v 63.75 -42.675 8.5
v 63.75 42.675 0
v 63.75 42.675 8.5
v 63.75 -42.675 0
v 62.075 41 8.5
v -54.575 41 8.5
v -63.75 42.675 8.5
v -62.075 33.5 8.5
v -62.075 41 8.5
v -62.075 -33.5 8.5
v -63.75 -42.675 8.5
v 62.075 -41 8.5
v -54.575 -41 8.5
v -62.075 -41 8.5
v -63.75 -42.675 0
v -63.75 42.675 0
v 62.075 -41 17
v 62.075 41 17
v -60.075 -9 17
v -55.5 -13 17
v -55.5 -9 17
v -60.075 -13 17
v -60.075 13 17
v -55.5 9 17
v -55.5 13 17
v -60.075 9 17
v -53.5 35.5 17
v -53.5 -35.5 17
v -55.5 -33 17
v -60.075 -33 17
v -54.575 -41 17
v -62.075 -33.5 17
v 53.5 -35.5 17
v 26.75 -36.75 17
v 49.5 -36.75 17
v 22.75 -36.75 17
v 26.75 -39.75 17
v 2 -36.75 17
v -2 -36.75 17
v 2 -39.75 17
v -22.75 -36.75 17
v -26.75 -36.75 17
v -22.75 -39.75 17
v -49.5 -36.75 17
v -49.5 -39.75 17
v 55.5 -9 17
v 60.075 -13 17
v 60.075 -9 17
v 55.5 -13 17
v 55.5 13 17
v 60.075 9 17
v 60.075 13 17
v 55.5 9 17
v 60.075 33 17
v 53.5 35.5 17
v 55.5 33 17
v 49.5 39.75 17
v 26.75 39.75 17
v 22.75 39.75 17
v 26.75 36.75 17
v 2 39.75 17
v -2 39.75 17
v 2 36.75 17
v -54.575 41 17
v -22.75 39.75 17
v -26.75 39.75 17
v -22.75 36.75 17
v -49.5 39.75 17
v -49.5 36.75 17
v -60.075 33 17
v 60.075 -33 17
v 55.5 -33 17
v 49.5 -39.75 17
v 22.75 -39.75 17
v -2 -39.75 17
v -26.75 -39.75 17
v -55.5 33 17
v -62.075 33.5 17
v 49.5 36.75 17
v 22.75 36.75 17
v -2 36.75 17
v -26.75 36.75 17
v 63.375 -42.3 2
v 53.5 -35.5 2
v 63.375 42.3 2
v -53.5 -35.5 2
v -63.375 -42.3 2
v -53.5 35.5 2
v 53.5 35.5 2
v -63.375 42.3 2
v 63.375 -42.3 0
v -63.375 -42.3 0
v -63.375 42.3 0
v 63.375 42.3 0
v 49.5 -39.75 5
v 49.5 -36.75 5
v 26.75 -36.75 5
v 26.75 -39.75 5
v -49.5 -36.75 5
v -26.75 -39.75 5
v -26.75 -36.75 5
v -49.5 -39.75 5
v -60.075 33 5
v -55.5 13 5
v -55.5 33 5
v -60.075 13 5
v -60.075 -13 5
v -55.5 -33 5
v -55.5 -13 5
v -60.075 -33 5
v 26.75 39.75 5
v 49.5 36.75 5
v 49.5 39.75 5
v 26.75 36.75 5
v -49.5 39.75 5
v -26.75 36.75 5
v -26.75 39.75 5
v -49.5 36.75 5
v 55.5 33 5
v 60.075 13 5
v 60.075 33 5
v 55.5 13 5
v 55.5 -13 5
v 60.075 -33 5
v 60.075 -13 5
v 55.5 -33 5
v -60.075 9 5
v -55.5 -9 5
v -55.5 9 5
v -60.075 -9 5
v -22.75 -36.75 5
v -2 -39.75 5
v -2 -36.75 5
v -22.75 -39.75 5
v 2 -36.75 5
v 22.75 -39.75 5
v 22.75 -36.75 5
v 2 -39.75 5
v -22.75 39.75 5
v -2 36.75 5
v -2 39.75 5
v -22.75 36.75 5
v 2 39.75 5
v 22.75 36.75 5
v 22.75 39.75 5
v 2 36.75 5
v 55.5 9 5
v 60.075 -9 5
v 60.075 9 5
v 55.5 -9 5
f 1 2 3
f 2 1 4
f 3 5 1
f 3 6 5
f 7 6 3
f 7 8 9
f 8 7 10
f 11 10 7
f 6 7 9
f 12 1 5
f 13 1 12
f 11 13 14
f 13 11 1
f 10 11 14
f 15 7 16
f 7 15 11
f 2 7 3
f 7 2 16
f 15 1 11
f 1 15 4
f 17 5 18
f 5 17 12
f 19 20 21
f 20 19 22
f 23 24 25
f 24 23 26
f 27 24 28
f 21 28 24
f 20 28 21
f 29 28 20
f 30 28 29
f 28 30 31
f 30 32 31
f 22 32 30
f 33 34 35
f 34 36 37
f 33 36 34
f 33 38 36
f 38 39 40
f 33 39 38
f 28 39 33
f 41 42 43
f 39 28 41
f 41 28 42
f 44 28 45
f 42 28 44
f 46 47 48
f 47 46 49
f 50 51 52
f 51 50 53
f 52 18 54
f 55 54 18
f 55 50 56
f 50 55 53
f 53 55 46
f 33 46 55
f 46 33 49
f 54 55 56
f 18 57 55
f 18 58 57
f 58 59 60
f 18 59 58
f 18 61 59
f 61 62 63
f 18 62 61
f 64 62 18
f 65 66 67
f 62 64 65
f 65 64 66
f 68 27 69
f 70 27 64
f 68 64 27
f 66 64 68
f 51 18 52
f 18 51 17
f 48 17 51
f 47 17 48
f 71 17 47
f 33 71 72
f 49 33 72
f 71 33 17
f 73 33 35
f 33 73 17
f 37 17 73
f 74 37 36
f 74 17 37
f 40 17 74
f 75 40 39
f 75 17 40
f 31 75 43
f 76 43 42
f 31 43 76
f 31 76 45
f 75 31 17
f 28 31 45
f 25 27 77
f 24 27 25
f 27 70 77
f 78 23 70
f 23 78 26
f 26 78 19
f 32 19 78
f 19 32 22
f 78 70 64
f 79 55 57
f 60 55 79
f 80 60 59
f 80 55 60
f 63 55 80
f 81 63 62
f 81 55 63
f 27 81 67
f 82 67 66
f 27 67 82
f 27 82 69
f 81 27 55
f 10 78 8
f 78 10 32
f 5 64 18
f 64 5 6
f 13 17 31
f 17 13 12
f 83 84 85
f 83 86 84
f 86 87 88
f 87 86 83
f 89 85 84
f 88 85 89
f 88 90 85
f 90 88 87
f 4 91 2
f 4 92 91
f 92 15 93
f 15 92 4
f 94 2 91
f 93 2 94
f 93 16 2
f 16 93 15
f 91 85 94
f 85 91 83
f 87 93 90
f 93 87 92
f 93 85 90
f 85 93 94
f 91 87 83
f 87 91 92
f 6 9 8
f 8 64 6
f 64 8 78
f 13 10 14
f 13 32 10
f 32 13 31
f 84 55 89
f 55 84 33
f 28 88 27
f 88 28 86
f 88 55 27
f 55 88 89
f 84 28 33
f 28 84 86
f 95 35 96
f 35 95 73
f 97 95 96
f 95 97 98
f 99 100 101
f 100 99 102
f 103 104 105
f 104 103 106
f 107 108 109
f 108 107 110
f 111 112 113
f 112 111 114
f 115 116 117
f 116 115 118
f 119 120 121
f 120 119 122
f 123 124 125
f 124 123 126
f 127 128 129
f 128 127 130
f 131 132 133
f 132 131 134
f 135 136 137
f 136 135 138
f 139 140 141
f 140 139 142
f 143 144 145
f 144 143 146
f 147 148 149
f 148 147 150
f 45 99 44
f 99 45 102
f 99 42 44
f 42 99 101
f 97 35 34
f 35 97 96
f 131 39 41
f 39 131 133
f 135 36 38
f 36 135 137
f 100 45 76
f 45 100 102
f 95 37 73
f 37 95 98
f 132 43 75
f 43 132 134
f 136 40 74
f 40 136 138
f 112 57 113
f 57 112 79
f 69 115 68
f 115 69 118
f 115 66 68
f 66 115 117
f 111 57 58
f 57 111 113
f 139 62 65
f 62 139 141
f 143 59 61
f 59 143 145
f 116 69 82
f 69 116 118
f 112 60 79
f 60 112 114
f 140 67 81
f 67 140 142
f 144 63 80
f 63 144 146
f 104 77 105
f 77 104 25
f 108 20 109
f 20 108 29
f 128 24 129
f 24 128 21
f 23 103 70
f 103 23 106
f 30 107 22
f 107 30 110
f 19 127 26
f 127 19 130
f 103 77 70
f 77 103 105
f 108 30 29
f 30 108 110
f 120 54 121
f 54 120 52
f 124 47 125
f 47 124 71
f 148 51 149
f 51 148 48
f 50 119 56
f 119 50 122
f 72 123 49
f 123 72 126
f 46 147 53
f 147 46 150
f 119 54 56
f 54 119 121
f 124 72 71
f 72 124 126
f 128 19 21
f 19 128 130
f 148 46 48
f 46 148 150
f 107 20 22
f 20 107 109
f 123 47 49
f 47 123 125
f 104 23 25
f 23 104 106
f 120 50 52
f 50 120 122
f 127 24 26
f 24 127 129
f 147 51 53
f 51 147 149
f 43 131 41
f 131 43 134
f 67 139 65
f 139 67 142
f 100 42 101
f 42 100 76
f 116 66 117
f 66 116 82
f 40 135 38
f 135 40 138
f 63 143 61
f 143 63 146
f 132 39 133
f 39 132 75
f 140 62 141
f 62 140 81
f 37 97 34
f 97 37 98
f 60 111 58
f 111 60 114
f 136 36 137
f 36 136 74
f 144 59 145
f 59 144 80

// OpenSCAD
// Generated by SolidPython 1.1.3 on 2024-12-03 19:32:34


difference() {
	union() {
		translate(v = [0, 22.0000000000, 0]) {
			translate(v = [0, -33.0000000000, 11.0000000000]) {
				cube(center = true, size = [124.1500000000, 4, 12]);
			}
		}
		translate(v = [0, 44.0000000000, 0]) {
			translate(v = [0, -33.0000000000, 11.0000000000]) {
				cube(center = true, size = [124.1500000000, 4, 12]);
			}
		}
		translate(v = [24.7500000000, 0, 0]) {
			translate(v = [-49.5000000000, 0, 11.0000000000]) {
				cube(center = true, size = [4, 82, 12]);
			}
		}
		translate(v = [49.5000000000, 0, 0]) {
			translate(v = [-49.5000000000, 0, 11.0000000000]) {
				cube(center = true, size = [4, 82, 12]);
			}
		}
		translate(v = [74.2500000000, 0, 0]) {
			translate(v = [-49.5000000000, 0, 11.0000000000]) {
				cube(center = true, size = [4, 82, 12]);
			}
		}
		difference() {
			difference() {
				difference() {
					difference() {
						union() {
							difference() {
								union() {
									translate(v = [0, 0, 4.2500000000]) {
										cube(center = true, size = [127.5000000000, 85.3500000000, 8.5000000000]);
									}
									translate(v = [0, 0, 12.7500000000]) {
										cube(center = true, size = [124.1500000000, 82, 8.5000000000]);
									}
								}
								translate(v = [0, 0, 1.0000000000]) {
									cube(center = true, size = [127.5000000000, 85.3500000000, 2]);
								}
							}
							intersection() {
								difference() {
									translate(v = [0, 0, 1.0000000000]) {
										cube(center = true, size = [127.5000000000, 85.3500000000, 2]);
									}
									translate(v = [0, 0, 1.0000000000]) {
										cube(center = true, size = [126.7500000000, 84.6000000000, 2]);
									}
								}
								union() {
									translate(v = [-63.7500000000, 42.6750000000, 0]) {
										translate(v = [0, 0, 1.0000000000]) {
											cube(center = true, size = [127.5000000000, 85.3500000000, 2]);
										}
									}
									translate(v = [63.7500000000, 42.6750000000, 0]) {
										translate(v = [0, 0, 1.0000000000]) {
											cube(center = true, size = [127.5000000000, 85.3500000000, 2]);
										}
									}
									translate(v = [-63.7500000000, -42.6750000000, 0]) {
										translate(v = [0, 0, 1.0000000000]) {
											cube(center = true, size = [127.5000000000, 85.3500000000, 2]);
										}
									}
									translate(v = [63.7500000000, -42.6750000000, 0]) {
										translate(v = [0, 0, 1.0000000000]) {
											cube(center = true, size = [127.5000000000, 85.3500000000, 2]);
										}
									}
								}
							}
						}
						union() {
							translate(v = [-62.0750000000, 41.0000000000, 8.5000000000]) {
								translate(v = [0, -7.5000000000, 0]) {
									linear_extrude(height = 8.5000000000) {
										polygon(points = [[0, 0], [0, 7.5000000000], [0, 7.5000000000], [0, 7.5000000000], [7.5000000000, 7.5000000000], [7.5000000000, 7.5000000000]]);
									}
								}
							}
							translate(v = [-62.0750000000, -41.0000000000, 8.5000000000]) {
								translate(v = [7.5000000000, 0, 0]) {
									rotate(a = 90) {
										linear_extrude(height = 8.5000000000) {
											polygon(points = [[0, 0], [0, 7.5000000000], [0, 7.5000000000], [0, 7.5000000000], [7.5000000000, 7.5000000000], [7.5000000000, 7.5000000000]]);
										}
									}
								}
							}
						}
					}
					translate(v = [0, 0, 8.5000000000]) {
						cube(center = true, size = [107, 71, 17.0000000000]);
					}
				}
				union() {
					translate(v = [0, -38.25, 0]) {
						translate(v = [0, 0, 11.0000000000]) {
							cube(center = true, size = [99, 3.0000000000, 12]);
						}
					}
					translate(v = [0, 38.25, 0]) {
						translate(v = [0, 0, 11.0000000000]) {
							cube(center = true, size = [99, 3.0000000000, 12]);
						}
					}
					translate(v = [-57.7875, 0, 0]) {
						translate(v = [0, 0, 11.0000000000]) {
							cube(center = true, size = [4.5750000000, 66, 12]);
						}
					}
					translate(v = [57.7875, 0, 0]) {
						translate(v = [0, 0, 11.0000000000]) {
							cube(center = true, size = [4.5750000000, 66, 12]);
						}
					}
				}
			}
			union() {
				translate(v = [0, 0, 17.0000000000]) {
					cube(center = true, size = [115.575, 66, 0]);
				}
				translate(v = [0, 0, 17.0000000000]) {
					cube(center = true, size = [99, 76.5, 0]);
				}
			}
		}
	}
	translate(v = [0, 0, 8.5000000000]) {
		cube(center = true, size = [107, 71, 17.0000000000]);
	}
}
/***********************************************
*********      SolidPython code:      **********
************************************************
 
import solid
import numpy as np
from make_device import make_unit_array
import os.path as osp
import os 
import math

chamfer_extrude=solid.import_scad("./chamfer_extrude.scad")
chamfer_extrude=chamfer_extrude.chamfer_extrude
version="print_PP_v2"
base_name="96_well_plate_reservoirs_"+version
base_path="./plates/"+base_name
#basic plate dims
plate_size_outer=[127.5,85.35]
plate_size_inner=[124.15,82]
plate_height_outer=8.5
plate_height_inner=8.5
plate_height=plate_height_inner+plate_height_outer
plate_under_depth=2
skirt_thickness=.75
skirt_hole_dims=[plate_size_outer[0],plate_size_outer[1]]
corner_x=7.5
corner_y=7.5
grid_size=[1,1]
#device_tol=2
#dims = [110-device_tol,74-device_tol,0]
#device_dims=[110-device_tol,74-device_tol]
dims = [107,71,0]
device_dims=[107,71]
reservoir_x_tol=8
reservoir_y_tol=5
reservoir_dims_x=[device_dims[0]-reservoir_x_tol,(plate_size_inner[1]-device_dims[1]-reservoir_y_tol)/2.0]
reservoir_dims_y=[(plate_size_inner[0]-device_dims[0]-reservoir_x_tol)/2.0,device_dims[1]-reservoir_y_tol]
reservoir_depth=12
lower_wall_height=0
release_holes=False
release_radius=2.5
reservoir_number_x=3
reservoir_number_y=4
reservoir_wall_thickness=4


def save_model(model,base_path,base_name):
    if not osp.exists(base_path):
        os.makedirs(base_path)
    scad_path=osp.join(base_path,base_name+".scad")
    solid.scad_render_to_file(model,osp.join(scad_path))

def center_unit_array(model,dims,grid_size):
    model = solid.translate([dims[0]/2.0,dims[1]/2.0,0])(model)
    model = solid.translate([-dims[0]*(grid_size[0]/2.0),
                             -dims[1]*(grid_size[1]/2.0),0])(model)
    return model


#plate_chassis
plate_height_diff=plate_height-plate_height_inner

#outer_plate as base
plate=solid.cube((*plate_size_outer,plate_height_diff),center=True)
plate=solid.translate([0,0,plate_height_diff/2.0])(plate)
#inner plate goes on top
plate_inner=solid.cube((*plate_size_inner,plate_height_inner),center=True)
plate_inner=solid.translate([0,0,plate_height_inner/2.0+plate_height_diff])(plate_inner)
plate=solid.union()(plate,plate_inner)


plate_under_remove_out=solid.cube((*plate_size_outer,plate_under_depth),center=True)
plate_under_remove_out=solid.translate([0,0,plate_under_depth/2.0])(plate_under_remove_out)
plate_under_remove_in=solid.cube((plate_size_outer[0]-skirt_thickness,plate_size_outer[1]-skirt_thickness,plate_under_depth),center=True)
plate_under_remove_in=solid.translate([0,0,plate_under_depth/2.0])(plate_under_remove_in)

plate_under_remove=solid.difference()(plate_under_remove_out,plate_under_remove_in)

corners_from_x_y = lambda x,y: [[-x/2.0,y/2.0],
                                    [x/2.0, y/2.0],
                                    [-x/2.0, -y/2.0],
                                    [x/2.0, -y/2.0]]
plate_under_remove_corner=solid.cube((*skirt_hole_dims,plate_under_depth),center=True)
plate_under_remove_corner=solid.translate([0,0,plate_under_depth/2.0])(plate_under_remove_corner)
plate_corners_pos=corners_from_x_y(*plate_size_outer)
plate_under_remove_corners=[]
for corner_pos in plate_corners_pos:
    temp_corner=solid.translate([*corner_pos,0])(plate_under_remove_corner)
    plate_under_remove_corners.append(temp_corner)

corners_remove=solid.union()(*plate_under_remove_corners)
skirt=solid.intersection()(plate_under_remove,corners_remove)
#chamfer skirt
#skirt=solid.projection()(skirt)
#skirt=chamfer_extrude(plate_under_depth,45,segments=20)(skirt)
#skirt=solid.linear_extrude(height=plate_under_depth)(skirt)
#skirt=solid.intersection()(plate,skirt)
#
#skirt=solid.translate([0,0,-plate_under_depth/2.0])(skirt)
#skirt=solid.rotate([0,180,0])(skirt)
#skirt=solid.translate([0,0,plate_under_depth/2.0])(skirt)

plate=solid.difference()(plate,plate_under_remove_out)
plate=solid.union()(plate,skirt)



#corners
#               0       1        2        3         4          5
corner_points=[[0,0,0],[0,corner_y,10],[0,corner_y,0],[0,corner_y,10],[corner_x,corner_y,10],[corner_x,corner_y,0]]
corner=solid.polygon(points=corner_points)()
corner=solid.linear_extrude(height=plate_height_inner)(corner)

corner_top_left=corner
corner_top_left=solid.translate([0,-corner_y,0])(corner_top_left)
corner_top_left=solid.translate([-plate_size_inner[0]/2.0,plate_size_inner[1]/2.0,plate_height_diff])(corner_top_left)

corner_bottom_left=solid.rotate(90)(corner)
corner_bottom_left=solid.translate([corner_x,0,0])(corner_bottom_left)
corner_bottom_left=solid.translate([-plate_size_inner[0]/2.0,-plate_size_inner[1]/2.0,plate_height_diff])(corner_bottom_left)

corners = solid.union()(corner_top_left,corner_bottom_left)
#corners = solid.union()(corner_top_left)
plate=solid.difference()(plate,corners)

device_dims = np.array(device_dims)
device_slot = solid.cube((*device_dims,plate_height),center=True)
device_slot = solid.translate([0,0,plate_height/2.0])(device_slot)
plate = solid.difference()(plate,device_slot)

#reservoirs
reservoir_x = solid.cube((*reservoir_dims_x,reservoir_depth),center=True)
reservoir_x = solid.translate([0,0,plate_height-reservoir_depth/2.0])(reservoir_x)
reservoir_y = solid.cube((*reservoir_dims_y,reservoir_depth),center=True)
reservoir_y = solid.translate([0,0,plate_height-reservoir_depth/2.0])(reservoir_y)
plate_top_x_thickness=(plate_size_inner[0]-device_dims[0])/2.0
x_pos_reservoir=plate_size_inner[0]/2.0-plate_top_x_thickness/2.0
plate_top_y_thickness=(plate_size_inner[1]-device_dims[1])/2.0
y_pos_reservoir=plate_size_inner[1]/2.0-plate_top_y_thickness/2.0
reservoir_x_top = solid.translate([0,y_pos_reservoir,0])(reservoir_x)
reservoir_x_bottom = solid.translate([0,-y_pos_reservoir,0])(reservoir_x)
reservoir_y_left = solid.translate([x_pos_reservoir,0,0])(reservoir_y)
reservoir_y_right = solid.translate([-x_pos_reservoir,0,0])(reservoir_y)




reservoir_x_wall = solid.cube((plate_size_inner[0],reservoir_wall_thickness,reservoir_depth),center=True)
reservoir_x_wall = solid.translate([0,-reservoir_dims_y[1]/2.0,plate_height-reservoir_depth/2.0])(reservoir_x_wall)
reservoir_x_walls = [] 
spacing_x=reservoir_dims_y[1]/reservoir_number_x

reservoir_y_wall = solid.cube((reservoir_wall_thickness,plate_size_inner[1],reservoir_depth),center=True)
reservoir_y_wall = solid.translate([-reservoir_dims_x[0]/2.0,0,plate_height-reservoir_depth/2.0])(reservoir_y_wall)
reservoir_y_walls = [] 
spacing_y=reservoir_dims_x[0]/reservoir_number_y


reservoirs = solid.union()(reservoir_x_bottom,reservoir_x_top,reservoir_y_right,reservoir_y_left)
plate = solid.difference()(plate,reservoirs)
reservoir_lower_wall_x = solid.cube((reservoir_dims_x[0],y_pos_reservoir*2,lower_wall_height),center=True)
reservoir_lower_wall_x = solid.translate([0,0,plate_height-lower_wall_height/2.0])(reservoir_lower_wall_x)
reservoir_lower_wall_y = solid.cube((x_pos_reservoir*2,reservoir_dims_y[1],lower_wall_height),center=True)
reservoir_lower_wall_y = solid.translate([0,0,plate_height-lower_wall_height/2.0])(reservoir_lower_wall_y)
reservoir_lower_wall = solid.union()(reservoir_lower_wall_y,reservoir_lower_wall_x)
plate = solid.difference()(plate,reservoir_lower_wall)



#release holes
release_x = solid.cylinder(r=release_radius, h=plate_size_inner[0],segments=64,center=True)
release_x = solid.rotate([0,90,0])(release_x)
release_x = solid.translate([0,-spacing_x/2.0,0])(release_x)
release_y = solid.cylinder(r=release_radius, h=plate_size_inner[1],segments=64,center=True)
release_y = solid.rotate([90,0,0])(release_y)
release_y = solid.translate([-spacing_y/2.0,0,0])(release_y)
release_holes = []

for i in range(reservoir_number_x-1):
    reservoir_x_walls.append(solid.translate([0,spacing_x*(i+1),0])(reservoir_x_wall))

release_x = solid.translate([0,-reservoir_dims_y[1]/2.0,0])(release_x)
for i in range(reservoir_number_x):
    release_holes.append(solid.translate([0,spacing_x*(i+1),0])(release_x))


for i in range(reservoir_number_y-1):
    reservoir_y_walls.append(solid.translate([spacing_y*(i+1),0,0])(reservoir_y_wall))

release_y = solid.translate([-reservoir_dims_x[0]/2.0,0,0])(release_y)
for i in range(reservoir_number_y):
    release_holes.append(solid.translate([spacing_y*(i+1),0,0])(release_y))


release_holes = solid.union()(*release_holes)
release_holes = solid.translate([0,0,plate_height])(release_holes)
if release_holes is True:
    plate = solid.difference()(plate,release_holes)
plate = solid.union()(*reservoir_x_walls,*reservoir_y_walls,plate)
plate = solid.difference()(plate,device_slot)

save_model(plate,base_path,base_name)
 
 
************************************************/
